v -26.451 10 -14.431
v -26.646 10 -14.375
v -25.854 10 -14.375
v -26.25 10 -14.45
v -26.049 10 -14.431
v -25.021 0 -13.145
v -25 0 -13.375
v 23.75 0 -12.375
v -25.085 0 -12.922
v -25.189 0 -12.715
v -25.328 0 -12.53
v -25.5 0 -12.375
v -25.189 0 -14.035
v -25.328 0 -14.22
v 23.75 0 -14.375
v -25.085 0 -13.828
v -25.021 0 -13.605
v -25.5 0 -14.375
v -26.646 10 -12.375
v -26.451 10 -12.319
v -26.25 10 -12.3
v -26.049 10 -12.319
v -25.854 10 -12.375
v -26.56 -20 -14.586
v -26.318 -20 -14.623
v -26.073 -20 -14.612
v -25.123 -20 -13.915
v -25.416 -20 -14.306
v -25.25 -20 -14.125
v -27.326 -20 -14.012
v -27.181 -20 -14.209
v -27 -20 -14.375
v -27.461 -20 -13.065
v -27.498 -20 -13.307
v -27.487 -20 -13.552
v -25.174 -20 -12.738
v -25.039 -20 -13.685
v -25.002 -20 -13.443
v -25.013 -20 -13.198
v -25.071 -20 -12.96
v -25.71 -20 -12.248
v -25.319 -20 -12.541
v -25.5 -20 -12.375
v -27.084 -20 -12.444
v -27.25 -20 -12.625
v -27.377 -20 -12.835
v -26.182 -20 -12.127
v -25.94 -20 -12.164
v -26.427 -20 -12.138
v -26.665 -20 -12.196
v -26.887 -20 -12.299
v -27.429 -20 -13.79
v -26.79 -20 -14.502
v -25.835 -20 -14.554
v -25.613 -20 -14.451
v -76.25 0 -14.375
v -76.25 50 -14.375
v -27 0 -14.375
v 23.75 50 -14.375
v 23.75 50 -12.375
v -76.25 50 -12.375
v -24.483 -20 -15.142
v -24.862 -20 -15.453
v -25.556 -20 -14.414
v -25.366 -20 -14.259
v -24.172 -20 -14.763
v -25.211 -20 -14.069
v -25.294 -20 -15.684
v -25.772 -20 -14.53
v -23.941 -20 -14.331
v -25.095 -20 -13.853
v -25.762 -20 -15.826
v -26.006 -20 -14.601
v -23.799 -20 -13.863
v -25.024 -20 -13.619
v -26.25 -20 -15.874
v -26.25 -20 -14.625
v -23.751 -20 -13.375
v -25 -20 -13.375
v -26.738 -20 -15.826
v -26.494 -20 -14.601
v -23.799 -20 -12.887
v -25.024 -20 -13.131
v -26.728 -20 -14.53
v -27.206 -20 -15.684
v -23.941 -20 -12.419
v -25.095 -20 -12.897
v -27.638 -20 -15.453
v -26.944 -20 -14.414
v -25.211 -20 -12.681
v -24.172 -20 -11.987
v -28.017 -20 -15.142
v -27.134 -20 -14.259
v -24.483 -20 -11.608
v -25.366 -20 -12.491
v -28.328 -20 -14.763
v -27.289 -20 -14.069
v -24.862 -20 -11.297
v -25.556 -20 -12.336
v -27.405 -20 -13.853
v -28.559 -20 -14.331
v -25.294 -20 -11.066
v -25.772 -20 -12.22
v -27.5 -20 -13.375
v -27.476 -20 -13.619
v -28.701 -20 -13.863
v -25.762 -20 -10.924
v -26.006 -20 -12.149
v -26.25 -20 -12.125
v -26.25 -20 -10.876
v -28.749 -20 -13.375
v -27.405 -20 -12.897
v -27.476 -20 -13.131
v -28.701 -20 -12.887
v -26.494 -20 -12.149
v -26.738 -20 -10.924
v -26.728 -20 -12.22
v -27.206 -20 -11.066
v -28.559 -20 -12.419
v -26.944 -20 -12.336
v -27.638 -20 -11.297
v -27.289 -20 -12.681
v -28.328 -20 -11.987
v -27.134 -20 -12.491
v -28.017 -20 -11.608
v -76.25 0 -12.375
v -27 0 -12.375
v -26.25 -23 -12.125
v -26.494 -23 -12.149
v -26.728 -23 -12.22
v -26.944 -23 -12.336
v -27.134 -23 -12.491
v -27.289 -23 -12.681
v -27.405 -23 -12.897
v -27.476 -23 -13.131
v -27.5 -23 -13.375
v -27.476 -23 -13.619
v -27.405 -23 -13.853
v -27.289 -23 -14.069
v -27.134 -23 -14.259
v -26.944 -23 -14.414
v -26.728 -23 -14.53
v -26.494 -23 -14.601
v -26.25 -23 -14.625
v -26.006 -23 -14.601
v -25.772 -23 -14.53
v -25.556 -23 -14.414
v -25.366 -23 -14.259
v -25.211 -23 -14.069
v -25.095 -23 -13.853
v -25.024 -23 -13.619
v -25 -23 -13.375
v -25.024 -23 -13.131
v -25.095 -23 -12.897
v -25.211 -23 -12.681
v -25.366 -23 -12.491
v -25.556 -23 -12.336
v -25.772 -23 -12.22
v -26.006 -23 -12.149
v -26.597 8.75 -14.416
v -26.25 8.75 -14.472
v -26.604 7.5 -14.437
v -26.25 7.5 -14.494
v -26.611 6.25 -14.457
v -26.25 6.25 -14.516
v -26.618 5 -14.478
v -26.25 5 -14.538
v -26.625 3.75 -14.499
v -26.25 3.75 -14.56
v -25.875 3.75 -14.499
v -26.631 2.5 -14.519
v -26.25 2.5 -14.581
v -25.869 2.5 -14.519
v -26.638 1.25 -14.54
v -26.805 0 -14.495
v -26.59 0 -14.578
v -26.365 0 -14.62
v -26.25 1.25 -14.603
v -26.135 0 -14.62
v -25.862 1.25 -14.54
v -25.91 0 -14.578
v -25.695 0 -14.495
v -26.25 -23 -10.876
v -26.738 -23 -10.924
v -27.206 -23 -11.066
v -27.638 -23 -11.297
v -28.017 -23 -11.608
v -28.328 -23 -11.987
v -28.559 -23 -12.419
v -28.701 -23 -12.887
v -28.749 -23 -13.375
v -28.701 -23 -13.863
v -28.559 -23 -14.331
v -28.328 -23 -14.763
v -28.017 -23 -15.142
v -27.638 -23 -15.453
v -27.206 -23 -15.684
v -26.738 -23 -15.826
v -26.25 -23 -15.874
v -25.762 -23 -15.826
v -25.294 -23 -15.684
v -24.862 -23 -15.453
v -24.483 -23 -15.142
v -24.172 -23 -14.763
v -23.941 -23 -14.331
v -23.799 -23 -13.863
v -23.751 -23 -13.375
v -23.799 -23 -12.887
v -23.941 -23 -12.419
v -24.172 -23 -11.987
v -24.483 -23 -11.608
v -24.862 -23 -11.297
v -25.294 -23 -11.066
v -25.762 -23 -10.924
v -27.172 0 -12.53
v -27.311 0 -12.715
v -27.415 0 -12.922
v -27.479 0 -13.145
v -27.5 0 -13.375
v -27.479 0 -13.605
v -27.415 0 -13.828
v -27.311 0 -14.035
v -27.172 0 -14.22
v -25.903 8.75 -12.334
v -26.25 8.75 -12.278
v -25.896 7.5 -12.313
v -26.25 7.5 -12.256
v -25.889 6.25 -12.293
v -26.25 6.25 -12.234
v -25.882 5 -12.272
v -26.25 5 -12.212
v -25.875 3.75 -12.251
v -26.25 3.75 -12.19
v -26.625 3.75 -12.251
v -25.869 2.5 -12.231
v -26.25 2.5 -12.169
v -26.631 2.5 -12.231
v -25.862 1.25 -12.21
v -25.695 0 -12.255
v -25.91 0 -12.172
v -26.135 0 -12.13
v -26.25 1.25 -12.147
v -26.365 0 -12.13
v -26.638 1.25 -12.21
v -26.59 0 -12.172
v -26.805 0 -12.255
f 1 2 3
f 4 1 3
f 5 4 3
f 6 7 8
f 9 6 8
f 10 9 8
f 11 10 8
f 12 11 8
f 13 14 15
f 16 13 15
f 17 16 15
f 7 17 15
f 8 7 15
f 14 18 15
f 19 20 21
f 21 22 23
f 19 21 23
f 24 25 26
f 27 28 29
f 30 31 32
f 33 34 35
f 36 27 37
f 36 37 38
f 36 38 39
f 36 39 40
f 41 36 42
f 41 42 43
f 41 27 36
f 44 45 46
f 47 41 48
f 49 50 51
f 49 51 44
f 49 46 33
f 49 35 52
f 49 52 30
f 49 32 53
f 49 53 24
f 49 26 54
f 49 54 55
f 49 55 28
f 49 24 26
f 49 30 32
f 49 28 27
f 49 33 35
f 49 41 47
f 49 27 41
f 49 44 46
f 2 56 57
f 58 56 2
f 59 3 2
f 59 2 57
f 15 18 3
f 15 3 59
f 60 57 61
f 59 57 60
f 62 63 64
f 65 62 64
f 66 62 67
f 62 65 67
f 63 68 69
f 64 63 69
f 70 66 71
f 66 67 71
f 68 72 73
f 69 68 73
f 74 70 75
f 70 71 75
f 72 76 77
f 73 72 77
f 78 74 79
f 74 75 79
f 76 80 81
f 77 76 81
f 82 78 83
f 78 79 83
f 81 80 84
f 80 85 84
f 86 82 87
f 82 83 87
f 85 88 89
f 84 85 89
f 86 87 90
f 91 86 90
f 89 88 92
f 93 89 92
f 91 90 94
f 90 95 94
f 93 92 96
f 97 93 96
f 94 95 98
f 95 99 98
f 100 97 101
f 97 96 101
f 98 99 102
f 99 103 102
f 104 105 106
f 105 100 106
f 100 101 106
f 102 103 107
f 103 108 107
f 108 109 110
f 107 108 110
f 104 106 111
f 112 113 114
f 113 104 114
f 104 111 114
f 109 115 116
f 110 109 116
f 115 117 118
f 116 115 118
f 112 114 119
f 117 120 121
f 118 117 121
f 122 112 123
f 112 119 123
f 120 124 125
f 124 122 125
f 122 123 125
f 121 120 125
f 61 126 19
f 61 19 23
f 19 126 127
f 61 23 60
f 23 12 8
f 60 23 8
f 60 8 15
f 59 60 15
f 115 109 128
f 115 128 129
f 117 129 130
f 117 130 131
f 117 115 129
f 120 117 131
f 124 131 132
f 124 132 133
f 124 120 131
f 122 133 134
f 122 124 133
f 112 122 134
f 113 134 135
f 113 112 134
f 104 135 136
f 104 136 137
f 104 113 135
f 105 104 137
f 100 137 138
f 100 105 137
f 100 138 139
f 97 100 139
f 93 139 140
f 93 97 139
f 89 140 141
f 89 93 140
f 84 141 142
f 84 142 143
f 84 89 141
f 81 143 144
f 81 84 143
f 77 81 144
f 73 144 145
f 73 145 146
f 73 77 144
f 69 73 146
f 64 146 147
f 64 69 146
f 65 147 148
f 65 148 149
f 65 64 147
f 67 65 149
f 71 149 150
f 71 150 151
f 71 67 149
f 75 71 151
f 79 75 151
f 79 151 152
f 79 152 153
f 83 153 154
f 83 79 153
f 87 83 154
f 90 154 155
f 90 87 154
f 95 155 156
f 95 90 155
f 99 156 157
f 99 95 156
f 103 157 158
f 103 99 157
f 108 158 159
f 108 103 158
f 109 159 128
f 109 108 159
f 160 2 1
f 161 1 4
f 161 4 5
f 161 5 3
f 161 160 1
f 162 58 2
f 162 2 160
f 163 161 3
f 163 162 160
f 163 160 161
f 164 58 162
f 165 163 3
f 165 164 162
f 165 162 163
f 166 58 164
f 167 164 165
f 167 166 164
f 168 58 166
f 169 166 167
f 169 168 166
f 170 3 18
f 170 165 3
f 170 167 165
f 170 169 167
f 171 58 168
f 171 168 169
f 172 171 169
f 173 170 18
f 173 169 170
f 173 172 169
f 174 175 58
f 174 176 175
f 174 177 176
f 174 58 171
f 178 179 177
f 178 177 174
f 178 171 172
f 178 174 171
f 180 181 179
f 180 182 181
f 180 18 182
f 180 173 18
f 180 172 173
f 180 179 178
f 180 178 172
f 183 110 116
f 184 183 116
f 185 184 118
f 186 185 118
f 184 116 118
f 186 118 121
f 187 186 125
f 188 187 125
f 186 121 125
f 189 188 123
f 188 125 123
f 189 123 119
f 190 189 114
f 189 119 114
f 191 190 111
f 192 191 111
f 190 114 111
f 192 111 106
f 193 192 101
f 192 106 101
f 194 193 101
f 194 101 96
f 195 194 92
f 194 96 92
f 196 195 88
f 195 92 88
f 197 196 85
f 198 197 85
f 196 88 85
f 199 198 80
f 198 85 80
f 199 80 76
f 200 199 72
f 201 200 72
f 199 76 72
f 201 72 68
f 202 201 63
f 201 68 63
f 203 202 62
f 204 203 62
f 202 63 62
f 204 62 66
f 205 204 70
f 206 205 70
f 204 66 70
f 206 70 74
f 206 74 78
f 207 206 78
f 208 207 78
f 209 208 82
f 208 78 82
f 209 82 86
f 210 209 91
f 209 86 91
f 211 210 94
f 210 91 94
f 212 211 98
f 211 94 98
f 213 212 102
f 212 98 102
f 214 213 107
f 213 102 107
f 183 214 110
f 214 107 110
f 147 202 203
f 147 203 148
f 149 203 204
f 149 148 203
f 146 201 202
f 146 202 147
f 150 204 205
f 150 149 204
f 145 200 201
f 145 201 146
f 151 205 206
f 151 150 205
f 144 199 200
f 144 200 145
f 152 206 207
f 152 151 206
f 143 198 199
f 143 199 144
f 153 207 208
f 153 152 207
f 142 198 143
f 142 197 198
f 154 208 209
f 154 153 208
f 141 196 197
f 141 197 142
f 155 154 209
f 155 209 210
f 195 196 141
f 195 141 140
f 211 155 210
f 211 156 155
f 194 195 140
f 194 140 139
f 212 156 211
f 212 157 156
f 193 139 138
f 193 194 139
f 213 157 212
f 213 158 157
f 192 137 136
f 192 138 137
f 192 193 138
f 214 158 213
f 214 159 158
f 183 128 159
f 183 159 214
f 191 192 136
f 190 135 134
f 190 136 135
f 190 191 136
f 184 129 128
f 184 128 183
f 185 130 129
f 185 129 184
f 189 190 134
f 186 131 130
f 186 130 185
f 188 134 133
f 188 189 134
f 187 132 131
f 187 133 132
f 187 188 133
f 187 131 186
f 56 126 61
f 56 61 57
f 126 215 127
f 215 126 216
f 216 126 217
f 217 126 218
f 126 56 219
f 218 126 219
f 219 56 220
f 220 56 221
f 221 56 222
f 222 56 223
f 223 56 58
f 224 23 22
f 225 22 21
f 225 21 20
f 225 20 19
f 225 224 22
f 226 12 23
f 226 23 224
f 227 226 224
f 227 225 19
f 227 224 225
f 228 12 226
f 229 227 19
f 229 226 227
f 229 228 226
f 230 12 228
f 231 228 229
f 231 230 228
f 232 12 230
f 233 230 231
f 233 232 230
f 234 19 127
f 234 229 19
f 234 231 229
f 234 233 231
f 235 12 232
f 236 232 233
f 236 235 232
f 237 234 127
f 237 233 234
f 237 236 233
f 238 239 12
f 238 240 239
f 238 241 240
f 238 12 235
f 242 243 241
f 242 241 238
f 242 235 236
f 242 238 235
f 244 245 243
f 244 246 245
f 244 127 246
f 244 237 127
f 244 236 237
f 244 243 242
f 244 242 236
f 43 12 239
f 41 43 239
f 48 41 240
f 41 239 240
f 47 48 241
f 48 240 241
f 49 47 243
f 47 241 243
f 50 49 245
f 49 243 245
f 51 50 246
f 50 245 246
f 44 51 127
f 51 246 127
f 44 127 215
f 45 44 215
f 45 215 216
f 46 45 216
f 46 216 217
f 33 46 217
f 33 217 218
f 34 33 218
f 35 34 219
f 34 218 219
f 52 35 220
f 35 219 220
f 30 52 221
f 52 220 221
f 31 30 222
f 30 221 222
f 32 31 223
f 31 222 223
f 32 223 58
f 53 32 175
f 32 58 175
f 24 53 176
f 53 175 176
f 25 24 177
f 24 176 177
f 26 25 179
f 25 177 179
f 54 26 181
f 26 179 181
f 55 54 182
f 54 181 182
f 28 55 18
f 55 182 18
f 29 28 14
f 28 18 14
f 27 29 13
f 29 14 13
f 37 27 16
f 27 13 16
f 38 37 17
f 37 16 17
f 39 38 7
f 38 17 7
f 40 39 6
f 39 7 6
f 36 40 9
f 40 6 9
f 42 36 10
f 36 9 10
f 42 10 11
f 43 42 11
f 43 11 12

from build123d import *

# Parameters (mm, degrees)
SKETCH1_W           = 100
SKETCH1_H           = 2
BOSS_EXTRUDE1_DEPTH = 50
SKETCH2_R           = 1.25
BOSS_EXTRUDE2_DEPTH = 10
BOSS_EXTRUDE2_DRAFT = -1
SKETCH3_R           = 1.25
BOSS_EXTRUDE3_DEPTH = 20
SKETCH4_R           = 2.499001264
SKETCH4_R_2         = 1.25
BOSS_EXTRUDE4_DEPTH = 3


with BuildPart() as part:
    # Sketch1 → Boss-Extrude1 (new body)
    with BuildSketch(Plane(origin=(0, 0, 0), x_dir=(1, 0, 0), z_dir=(0, 1, 0))):
        with Locations((-26.25, 13.375)):
            Rectangle(SKETCH1_W, SKETCH1_H)
    extrude(amount=BOSS_EXTRUDE1_DEPTH)


with BuildPart() as boss_extrude2_tool:
    # Sketch2 → Boss-Extrude2 (with draft: the straight prism first)
    with BuildSketch(Plane.XZ):
        with Locations((-26.25, -13.375)):
            Circle(SKETCH2_R)
    extrude(amount=-BOSS_EXTRUDE2_DEPTH)
    # Boss-Extrude2: the draft: its side faces are tilted about the plane it starts from
    boss_extrude2_sides = [boss_extrude2_tool.faces().sort_by_distance(p)[0] for p in [
        (-27.5, 5, -13.375),
    ]]
    draft(boss_extrude2_sides, Plane.XZ, BOSS_EXTRUDE2_DRAFT)


with BuildPart() as part_1:
    add(part.part)

    # Boss-Extrude2: add boss_extrude2_tool
    add(boss_extrude2_tool.part)

    # Sketch3 → Boss-Extrude3 (add)
    with BuildSketch(Plane.XZ):
        with Locations(Location((-26.25, -13.375, 0), (0, 0, 53.130102354))):
            Circle(SKETCH3_R)
    extrude(amount=BOSS_EXTRUDE3_DEPTH)


with BuildPart() as body_2:
    # Sketch4 → Boss-Extrude4 (new body)
    with BuildSketch(Plane.XZ.offset(20)):
        with Locations(Location((-26.25, -13.375, 0), (0, 0, 90))):
            Circle(SKETCH4_R)
        with Locations(Location((-26.25, -13.375, 0), (0, 0, 90))):
            Circle(SKETCH4_R_2, mode=Mode.SUBTRACT)
    extrude(amount=BOSS_EXTRUDE4_DEPTH)


solid = Compound([part_1.part, body_2.part])
